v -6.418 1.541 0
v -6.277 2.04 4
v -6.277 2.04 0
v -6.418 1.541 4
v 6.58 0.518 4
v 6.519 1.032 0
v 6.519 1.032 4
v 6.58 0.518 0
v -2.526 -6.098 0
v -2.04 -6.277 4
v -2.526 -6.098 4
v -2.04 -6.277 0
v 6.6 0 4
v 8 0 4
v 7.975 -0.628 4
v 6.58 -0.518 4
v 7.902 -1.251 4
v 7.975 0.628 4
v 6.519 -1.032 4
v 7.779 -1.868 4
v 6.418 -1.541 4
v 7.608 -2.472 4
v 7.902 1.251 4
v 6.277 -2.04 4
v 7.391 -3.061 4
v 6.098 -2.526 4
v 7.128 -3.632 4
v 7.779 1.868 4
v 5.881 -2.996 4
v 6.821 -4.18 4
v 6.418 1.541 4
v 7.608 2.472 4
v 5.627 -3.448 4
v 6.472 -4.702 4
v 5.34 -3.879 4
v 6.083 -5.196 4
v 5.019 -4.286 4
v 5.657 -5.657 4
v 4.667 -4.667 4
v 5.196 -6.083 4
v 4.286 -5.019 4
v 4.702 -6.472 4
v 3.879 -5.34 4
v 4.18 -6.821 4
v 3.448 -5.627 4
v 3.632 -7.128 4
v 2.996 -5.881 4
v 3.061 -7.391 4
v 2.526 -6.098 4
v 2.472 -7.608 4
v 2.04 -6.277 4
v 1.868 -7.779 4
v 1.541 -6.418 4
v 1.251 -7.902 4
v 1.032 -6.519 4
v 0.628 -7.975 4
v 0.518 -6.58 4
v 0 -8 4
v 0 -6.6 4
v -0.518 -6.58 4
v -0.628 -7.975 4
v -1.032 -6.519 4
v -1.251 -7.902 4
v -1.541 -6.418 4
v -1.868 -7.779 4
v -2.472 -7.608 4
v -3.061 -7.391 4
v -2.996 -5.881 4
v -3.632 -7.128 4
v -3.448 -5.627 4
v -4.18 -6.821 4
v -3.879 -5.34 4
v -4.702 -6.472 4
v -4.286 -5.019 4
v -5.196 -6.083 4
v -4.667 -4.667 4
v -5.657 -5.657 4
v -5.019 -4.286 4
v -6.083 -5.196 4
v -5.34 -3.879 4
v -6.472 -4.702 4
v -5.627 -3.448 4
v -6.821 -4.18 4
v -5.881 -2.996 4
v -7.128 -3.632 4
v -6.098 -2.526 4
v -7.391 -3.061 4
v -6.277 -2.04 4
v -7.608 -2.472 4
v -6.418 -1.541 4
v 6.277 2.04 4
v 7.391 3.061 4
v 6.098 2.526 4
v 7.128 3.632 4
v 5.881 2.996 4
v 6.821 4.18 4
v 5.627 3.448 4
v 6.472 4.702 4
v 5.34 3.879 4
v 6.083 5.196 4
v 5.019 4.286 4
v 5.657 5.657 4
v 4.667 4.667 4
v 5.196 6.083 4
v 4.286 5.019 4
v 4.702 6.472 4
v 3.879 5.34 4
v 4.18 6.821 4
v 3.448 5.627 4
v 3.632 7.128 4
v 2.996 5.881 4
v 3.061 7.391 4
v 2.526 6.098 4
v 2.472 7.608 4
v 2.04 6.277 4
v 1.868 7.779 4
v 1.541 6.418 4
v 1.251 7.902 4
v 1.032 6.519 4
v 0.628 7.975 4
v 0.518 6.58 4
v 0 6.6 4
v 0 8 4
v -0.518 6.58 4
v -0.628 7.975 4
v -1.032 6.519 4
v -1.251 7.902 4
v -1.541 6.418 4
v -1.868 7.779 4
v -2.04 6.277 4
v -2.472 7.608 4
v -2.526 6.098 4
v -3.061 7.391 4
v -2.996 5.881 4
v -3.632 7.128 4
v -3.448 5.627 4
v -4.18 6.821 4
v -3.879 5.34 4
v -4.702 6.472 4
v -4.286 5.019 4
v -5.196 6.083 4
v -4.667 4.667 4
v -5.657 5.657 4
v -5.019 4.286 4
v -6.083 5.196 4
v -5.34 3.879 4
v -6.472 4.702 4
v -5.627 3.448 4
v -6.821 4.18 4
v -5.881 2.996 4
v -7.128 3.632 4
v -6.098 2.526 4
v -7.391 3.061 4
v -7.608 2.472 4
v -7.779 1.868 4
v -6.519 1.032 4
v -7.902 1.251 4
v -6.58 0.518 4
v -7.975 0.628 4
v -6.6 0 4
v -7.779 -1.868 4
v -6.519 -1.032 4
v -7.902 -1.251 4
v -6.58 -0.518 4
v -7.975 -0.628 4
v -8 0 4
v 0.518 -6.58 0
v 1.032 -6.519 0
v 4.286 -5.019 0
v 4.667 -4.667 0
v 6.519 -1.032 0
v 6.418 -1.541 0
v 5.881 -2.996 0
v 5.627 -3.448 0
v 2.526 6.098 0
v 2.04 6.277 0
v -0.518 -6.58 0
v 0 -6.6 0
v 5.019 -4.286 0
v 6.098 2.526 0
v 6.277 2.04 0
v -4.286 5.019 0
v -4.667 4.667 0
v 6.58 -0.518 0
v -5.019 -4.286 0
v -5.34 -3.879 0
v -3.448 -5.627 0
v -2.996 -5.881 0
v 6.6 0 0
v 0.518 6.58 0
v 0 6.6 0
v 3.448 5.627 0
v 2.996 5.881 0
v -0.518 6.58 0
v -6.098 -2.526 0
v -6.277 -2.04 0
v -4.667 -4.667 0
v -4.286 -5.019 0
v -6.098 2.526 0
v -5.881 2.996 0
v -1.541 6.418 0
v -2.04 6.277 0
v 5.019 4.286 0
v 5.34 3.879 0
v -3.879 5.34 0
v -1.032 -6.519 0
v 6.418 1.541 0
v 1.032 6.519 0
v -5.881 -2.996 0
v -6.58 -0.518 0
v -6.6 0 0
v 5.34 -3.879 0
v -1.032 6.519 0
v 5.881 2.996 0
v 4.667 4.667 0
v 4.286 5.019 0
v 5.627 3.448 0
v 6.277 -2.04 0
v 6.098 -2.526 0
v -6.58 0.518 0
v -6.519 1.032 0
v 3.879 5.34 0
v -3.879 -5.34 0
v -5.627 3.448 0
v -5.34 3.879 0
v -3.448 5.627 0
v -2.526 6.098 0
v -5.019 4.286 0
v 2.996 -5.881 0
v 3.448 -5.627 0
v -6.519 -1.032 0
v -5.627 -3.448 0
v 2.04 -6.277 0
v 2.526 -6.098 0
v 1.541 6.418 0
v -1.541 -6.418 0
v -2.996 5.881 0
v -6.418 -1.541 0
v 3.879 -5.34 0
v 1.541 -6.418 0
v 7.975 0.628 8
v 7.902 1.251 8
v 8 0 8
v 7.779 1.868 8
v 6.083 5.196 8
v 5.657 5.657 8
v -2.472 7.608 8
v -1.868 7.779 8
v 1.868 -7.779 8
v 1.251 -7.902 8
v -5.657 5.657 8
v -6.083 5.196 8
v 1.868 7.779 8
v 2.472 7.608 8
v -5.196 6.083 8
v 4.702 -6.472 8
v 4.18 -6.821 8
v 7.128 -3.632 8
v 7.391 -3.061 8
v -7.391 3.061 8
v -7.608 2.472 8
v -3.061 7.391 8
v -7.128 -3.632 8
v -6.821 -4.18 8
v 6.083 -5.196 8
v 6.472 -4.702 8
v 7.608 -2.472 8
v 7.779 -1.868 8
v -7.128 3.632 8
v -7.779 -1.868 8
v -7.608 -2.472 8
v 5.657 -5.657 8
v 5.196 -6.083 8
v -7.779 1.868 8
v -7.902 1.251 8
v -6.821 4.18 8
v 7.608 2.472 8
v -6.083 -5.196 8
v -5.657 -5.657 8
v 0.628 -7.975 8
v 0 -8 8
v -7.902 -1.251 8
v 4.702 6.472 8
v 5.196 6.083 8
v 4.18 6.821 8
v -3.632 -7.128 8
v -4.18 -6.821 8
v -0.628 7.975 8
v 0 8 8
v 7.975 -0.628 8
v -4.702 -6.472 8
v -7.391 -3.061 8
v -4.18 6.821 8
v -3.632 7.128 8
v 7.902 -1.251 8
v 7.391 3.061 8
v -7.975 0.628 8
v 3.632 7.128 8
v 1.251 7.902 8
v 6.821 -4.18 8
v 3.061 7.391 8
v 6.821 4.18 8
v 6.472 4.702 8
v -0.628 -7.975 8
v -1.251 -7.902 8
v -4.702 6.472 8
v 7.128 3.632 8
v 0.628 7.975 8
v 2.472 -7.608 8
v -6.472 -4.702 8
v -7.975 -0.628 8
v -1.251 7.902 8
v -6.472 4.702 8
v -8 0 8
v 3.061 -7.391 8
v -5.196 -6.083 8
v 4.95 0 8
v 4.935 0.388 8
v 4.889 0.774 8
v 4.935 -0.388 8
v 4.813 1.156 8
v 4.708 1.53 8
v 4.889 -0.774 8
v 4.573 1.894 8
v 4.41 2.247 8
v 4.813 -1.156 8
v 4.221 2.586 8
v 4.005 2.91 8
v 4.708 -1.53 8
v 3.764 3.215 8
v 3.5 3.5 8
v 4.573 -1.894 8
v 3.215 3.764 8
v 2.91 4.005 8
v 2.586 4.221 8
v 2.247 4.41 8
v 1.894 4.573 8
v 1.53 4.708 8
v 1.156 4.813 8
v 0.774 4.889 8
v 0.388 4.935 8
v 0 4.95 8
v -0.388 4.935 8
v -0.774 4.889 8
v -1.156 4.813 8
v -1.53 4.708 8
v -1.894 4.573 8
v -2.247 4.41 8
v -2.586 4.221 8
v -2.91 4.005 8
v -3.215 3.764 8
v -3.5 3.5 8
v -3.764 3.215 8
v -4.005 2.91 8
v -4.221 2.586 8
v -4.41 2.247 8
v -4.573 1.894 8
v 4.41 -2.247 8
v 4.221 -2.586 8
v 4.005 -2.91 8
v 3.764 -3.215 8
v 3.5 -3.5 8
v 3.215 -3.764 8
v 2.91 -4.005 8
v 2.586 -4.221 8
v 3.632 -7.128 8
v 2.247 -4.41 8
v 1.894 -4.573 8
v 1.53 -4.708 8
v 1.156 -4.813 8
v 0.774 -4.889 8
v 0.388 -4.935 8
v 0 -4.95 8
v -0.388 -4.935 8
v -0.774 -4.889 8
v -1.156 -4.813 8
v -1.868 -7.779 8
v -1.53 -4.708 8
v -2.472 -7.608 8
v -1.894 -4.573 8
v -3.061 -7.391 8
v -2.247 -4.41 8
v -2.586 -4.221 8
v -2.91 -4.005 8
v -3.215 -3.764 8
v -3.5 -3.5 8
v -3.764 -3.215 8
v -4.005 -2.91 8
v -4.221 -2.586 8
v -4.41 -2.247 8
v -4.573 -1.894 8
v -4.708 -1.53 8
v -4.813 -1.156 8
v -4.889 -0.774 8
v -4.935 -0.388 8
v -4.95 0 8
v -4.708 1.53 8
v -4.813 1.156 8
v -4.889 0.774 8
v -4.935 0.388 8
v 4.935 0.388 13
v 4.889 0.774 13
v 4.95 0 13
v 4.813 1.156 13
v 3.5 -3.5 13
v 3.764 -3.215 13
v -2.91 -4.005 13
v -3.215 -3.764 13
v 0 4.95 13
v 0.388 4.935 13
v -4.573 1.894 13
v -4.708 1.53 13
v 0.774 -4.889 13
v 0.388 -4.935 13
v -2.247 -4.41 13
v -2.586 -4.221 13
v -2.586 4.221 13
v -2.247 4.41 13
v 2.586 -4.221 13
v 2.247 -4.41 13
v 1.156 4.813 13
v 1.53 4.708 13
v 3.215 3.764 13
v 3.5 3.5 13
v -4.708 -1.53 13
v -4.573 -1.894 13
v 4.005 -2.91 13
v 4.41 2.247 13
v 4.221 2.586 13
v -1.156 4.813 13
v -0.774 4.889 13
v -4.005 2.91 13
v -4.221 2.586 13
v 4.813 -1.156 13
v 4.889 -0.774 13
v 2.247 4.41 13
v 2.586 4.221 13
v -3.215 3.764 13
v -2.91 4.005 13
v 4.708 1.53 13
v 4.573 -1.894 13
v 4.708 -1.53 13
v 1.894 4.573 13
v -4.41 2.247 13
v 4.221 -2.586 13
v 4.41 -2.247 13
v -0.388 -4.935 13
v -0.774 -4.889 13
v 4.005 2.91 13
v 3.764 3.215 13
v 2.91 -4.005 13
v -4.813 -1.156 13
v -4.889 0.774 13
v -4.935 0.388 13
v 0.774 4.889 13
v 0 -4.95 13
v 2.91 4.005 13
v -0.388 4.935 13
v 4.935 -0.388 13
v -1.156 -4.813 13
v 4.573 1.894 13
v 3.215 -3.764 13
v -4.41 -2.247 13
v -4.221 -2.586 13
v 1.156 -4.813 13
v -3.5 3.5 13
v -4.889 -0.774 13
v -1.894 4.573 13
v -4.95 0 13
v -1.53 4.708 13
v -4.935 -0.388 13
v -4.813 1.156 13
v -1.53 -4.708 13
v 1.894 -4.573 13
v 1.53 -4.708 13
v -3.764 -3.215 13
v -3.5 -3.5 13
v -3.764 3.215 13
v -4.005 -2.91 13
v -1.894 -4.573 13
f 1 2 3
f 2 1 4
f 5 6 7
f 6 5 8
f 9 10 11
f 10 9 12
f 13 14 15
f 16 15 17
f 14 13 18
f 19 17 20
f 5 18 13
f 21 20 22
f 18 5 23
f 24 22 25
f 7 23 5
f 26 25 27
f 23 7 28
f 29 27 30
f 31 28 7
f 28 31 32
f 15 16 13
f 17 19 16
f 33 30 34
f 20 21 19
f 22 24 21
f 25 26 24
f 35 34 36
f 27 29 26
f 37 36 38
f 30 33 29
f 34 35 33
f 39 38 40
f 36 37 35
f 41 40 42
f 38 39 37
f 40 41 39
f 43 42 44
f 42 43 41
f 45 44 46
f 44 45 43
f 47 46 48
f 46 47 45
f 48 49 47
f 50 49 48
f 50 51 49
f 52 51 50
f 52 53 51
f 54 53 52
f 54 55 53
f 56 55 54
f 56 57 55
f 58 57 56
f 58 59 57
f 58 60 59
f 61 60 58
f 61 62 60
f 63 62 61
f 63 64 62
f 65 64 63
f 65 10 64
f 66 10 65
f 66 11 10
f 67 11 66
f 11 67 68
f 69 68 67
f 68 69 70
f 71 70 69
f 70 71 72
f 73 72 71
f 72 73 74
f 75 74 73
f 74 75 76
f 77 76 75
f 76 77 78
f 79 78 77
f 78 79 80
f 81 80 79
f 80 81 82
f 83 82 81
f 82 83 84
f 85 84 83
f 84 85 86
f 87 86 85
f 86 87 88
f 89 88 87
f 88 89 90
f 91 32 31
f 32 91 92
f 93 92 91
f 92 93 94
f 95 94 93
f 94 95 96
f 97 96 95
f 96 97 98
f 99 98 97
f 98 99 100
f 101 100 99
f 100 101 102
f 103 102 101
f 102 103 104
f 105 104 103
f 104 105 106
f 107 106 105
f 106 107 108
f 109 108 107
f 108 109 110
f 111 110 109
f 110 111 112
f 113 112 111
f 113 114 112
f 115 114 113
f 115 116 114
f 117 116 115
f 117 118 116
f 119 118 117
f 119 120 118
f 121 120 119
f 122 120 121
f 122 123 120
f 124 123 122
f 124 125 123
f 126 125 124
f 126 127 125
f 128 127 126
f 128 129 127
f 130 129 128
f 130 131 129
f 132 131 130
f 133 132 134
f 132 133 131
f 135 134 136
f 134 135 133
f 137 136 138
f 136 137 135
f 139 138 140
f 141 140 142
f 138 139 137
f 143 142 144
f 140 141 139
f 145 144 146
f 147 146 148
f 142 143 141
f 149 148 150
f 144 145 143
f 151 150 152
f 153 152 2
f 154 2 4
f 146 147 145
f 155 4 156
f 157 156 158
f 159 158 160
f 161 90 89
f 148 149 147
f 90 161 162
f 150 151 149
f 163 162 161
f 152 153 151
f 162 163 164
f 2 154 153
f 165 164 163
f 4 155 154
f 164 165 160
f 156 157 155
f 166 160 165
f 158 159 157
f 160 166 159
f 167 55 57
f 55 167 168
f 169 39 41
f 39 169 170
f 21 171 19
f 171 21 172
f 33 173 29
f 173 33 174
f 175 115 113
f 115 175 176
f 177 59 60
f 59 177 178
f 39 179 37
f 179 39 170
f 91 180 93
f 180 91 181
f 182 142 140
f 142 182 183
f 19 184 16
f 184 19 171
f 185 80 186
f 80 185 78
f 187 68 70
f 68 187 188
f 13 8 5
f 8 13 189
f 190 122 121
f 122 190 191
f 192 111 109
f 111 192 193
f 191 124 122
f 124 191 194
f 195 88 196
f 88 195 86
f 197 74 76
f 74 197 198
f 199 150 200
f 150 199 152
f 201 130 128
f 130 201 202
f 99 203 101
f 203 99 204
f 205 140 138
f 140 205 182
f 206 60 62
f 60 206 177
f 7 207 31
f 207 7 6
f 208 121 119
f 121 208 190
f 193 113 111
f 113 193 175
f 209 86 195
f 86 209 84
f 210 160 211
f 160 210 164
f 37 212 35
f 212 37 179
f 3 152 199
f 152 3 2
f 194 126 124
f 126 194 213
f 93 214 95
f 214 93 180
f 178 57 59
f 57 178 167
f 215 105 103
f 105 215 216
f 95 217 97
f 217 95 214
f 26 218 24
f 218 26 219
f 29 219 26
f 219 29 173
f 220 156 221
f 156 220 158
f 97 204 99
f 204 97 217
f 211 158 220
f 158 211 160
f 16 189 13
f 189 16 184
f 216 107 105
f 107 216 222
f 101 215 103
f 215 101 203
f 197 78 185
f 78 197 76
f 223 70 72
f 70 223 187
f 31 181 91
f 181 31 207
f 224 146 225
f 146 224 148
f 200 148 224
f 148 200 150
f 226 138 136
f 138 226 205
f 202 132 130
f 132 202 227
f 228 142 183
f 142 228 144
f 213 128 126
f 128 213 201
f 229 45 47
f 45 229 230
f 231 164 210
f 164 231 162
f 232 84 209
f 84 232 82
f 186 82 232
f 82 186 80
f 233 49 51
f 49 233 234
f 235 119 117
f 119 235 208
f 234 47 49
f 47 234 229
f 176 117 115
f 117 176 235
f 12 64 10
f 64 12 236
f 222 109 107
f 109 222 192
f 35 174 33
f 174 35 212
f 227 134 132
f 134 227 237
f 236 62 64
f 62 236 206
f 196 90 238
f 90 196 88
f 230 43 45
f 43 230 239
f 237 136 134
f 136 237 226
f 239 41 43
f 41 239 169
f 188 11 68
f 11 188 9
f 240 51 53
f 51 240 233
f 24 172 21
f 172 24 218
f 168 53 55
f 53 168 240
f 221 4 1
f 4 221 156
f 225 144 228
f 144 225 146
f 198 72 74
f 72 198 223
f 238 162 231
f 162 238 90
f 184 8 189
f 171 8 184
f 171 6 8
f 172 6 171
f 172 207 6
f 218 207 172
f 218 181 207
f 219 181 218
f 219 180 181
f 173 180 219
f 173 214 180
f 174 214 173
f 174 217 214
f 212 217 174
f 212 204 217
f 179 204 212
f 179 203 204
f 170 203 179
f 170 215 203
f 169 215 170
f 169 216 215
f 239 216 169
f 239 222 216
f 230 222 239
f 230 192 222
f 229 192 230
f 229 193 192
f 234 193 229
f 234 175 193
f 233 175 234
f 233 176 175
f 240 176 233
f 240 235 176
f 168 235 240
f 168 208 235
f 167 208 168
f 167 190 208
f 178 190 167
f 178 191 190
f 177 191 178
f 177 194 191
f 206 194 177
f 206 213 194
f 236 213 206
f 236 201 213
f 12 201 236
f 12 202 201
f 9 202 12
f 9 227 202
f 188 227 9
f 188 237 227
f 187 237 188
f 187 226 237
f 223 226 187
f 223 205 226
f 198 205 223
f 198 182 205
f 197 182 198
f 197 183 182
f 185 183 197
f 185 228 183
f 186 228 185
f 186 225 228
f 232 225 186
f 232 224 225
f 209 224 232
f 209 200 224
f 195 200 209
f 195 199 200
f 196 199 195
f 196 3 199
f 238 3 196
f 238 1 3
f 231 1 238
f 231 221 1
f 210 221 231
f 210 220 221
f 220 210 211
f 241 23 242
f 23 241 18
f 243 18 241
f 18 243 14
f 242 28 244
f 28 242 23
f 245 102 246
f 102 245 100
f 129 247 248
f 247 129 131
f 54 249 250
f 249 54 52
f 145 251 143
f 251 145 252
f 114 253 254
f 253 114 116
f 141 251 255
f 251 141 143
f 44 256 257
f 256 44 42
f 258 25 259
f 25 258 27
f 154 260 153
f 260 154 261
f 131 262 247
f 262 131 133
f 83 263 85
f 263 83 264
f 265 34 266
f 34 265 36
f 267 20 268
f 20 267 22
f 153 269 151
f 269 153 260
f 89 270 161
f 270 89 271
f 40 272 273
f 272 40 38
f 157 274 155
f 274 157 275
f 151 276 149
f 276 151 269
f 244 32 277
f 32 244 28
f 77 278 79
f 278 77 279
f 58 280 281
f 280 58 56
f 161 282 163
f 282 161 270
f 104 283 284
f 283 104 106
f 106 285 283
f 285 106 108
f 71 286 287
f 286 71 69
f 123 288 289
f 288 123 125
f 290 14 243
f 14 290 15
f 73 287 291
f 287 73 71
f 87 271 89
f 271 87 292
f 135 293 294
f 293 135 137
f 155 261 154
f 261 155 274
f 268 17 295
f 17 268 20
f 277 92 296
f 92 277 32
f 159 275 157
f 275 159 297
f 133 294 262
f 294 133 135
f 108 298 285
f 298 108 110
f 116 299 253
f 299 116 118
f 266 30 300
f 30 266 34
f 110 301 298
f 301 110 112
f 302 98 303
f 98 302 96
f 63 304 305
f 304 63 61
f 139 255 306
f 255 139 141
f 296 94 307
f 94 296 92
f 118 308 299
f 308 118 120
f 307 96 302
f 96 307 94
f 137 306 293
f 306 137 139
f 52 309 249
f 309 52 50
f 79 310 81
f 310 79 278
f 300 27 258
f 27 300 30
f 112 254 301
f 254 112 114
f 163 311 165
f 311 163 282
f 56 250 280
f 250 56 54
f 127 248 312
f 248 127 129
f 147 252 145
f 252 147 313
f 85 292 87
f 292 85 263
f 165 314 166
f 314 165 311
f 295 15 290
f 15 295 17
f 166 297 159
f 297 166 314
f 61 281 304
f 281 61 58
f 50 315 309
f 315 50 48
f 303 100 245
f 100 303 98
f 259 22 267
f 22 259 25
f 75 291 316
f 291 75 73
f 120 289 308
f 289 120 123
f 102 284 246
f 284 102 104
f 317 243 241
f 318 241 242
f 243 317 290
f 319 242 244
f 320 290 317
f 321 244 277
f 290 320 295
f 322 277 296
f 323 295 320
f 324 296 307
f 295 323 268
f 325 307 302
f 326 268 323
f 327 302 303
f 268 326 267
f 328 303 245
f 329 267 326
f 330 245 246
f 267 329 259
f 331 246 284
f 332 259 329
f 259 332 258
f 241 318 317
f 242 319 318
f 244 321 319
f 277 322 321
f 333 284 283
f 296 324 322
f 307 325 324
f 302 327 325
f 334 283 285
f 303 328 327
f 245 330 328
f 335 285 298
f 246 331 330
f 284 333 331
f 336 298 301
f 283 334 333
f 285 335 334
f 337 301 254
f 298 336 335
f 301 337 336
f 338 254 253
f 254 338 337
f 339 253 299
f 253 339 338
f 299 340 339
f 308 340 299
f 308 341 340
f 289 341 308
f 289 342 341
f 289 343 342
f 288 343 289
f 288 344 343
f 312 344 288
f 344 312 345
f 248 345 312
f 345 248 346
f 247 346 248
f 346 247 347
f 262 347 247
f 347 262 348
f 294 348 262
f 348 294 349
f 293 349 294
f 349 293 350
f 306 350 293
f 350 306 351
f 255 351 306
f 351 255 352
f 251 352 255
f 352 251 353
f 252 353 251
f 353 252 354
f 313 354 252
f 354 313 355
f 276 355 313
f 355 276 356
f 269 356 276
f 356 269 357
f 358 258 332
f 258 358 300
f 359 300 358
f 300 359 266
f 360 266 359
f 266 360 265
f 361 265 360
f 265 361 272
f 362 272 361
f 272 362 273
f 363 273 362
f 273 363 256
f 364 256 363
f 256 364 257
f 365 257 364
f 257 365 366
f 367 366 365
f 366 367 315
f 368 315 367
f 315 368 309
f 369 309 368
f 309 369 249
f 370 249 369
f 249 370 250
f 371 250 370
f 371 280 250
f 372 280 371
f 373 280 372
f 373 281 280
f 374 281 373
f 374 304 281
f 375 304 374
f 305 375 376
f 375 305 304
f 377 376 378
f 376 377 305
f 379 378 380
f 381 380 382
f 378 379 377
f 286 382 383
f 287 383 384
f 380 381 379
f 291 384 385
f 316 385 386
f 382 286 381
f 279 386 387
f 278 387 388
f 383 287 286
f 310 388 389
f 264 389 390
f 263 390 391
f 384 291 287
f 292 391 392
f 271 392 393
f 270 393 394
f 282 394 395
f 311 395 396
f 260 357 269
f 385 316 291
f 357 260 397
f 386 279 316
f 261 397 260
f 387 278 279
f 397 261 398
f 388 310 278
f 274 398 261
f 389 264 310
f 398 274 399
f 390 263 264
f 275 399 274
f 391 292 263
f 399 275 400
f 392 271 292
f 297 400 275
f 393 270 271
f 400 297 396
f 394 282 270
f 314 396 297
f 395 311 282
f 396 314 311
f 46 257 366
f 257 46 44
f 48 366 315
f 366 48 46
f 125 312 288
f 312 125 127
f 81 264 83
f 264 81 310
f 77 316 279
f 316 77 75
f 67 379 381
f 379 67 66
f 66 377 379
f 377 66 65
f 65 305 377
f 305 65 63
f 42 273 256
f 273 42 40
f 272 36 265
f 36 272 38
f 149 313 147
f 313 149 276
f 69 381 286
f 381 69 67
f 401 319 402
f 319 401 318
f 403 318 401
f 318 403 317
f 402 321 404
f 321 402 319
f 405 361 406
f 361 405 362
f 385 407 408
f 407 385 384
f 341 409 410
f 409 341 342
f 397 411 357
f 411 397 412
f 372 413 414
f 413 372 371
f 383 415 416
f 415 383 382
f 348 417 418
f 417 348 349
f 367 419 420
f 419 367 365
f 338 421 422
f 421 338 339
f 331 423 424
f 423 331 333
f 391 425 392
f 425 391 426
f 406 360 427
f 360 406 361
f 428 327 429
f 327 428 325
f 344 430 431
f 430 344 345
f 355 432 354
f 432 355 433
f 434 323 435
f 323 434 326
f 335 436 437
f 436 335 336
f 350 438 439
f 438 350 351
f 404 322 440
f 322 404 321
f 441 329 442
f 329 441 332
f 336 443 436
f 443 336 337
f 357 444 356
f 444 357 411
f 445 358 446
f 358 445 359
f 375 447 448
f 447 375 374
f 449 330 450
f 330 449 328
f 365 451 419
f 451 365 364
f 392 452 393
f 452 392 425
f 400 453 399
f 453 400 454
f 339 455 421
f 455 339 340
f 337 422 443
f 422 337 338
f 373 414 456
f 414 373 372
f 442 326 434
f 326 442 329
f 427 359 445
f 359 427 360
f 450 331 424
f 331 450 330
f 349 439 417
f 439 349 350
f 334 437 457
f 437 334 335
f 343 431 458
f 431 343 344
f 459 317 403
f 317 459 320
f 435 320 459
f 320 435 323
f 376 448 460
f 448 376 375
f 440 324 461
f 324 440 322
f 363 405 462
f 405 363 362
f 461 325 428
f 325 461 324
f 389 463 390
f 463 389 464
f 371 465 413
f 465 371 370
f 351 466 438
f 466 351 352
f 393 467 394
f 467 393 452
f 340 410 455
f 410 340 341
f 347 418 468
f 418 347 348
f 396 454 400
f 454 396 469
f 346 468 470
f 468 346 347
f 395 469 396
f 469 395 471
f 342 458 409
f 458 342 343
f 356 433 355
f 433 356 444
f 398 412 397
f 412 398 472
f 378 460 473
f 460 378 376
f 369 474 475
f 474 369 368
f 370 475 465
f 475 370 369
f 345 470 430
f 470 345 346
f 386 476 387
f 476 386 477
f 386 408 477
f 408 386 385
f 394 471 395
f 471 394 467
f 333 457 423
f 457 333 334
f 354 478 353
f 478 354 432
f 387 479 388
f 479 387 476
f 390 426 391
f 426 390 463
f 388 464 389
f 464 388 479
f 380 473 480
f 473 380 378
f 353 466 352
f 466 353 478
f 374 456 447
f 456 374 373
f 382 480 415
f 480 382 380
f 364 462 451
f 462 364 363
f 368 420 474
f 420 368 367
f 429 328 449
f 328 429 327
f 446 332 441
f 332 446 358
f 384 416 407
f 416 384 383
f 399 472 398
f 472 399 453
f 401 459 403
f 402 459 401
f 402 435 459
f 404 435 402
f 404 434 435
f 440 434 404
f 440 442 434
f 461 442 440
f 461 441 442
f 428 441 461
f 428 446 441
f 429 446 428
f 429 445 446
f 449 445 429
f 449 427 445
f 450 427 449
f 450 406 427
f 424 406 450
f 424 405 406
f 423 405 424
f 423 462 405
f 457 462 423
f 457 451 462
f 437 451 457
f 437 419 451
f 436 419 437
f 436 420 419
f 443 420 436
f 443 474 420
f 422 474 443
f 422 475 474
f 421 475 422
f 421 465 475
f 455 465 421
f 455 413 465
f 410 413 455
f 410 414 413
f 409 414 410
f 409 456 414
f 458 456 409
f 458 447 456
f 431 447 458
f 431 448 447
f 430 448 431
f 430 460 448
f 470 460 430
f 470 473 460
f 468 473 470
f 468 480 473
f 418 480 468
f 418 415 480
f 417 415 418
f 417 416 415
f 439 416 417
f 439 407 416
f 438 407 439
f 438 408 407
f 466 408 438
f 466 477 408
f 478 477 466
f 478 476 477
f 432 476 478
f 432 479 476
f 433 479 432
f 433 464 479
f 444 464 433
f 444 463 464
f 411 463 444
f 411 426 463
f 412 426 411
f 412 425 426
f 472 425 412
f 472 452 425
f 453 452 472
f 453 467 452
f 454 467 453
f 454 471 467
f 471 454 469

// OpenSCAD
bottom_r = 6.6;
bottom_height = 4;

top_r = 8;
top_height = 4;

inner_inset_r = 4.95;
inner_inset_height = 5;

$fn=80;


cylinder(bottom_height, bottom_r, bottom_r, false);
translate([0, 0, bottom_height])
{
    cylinder(top_height, top_r, top_r, false);
}
translate([0, 0, (bottom_height + top_height)])
{
    cylinder(inner_inset_height, inner_inset_r, inner_inset_r, false);
}
